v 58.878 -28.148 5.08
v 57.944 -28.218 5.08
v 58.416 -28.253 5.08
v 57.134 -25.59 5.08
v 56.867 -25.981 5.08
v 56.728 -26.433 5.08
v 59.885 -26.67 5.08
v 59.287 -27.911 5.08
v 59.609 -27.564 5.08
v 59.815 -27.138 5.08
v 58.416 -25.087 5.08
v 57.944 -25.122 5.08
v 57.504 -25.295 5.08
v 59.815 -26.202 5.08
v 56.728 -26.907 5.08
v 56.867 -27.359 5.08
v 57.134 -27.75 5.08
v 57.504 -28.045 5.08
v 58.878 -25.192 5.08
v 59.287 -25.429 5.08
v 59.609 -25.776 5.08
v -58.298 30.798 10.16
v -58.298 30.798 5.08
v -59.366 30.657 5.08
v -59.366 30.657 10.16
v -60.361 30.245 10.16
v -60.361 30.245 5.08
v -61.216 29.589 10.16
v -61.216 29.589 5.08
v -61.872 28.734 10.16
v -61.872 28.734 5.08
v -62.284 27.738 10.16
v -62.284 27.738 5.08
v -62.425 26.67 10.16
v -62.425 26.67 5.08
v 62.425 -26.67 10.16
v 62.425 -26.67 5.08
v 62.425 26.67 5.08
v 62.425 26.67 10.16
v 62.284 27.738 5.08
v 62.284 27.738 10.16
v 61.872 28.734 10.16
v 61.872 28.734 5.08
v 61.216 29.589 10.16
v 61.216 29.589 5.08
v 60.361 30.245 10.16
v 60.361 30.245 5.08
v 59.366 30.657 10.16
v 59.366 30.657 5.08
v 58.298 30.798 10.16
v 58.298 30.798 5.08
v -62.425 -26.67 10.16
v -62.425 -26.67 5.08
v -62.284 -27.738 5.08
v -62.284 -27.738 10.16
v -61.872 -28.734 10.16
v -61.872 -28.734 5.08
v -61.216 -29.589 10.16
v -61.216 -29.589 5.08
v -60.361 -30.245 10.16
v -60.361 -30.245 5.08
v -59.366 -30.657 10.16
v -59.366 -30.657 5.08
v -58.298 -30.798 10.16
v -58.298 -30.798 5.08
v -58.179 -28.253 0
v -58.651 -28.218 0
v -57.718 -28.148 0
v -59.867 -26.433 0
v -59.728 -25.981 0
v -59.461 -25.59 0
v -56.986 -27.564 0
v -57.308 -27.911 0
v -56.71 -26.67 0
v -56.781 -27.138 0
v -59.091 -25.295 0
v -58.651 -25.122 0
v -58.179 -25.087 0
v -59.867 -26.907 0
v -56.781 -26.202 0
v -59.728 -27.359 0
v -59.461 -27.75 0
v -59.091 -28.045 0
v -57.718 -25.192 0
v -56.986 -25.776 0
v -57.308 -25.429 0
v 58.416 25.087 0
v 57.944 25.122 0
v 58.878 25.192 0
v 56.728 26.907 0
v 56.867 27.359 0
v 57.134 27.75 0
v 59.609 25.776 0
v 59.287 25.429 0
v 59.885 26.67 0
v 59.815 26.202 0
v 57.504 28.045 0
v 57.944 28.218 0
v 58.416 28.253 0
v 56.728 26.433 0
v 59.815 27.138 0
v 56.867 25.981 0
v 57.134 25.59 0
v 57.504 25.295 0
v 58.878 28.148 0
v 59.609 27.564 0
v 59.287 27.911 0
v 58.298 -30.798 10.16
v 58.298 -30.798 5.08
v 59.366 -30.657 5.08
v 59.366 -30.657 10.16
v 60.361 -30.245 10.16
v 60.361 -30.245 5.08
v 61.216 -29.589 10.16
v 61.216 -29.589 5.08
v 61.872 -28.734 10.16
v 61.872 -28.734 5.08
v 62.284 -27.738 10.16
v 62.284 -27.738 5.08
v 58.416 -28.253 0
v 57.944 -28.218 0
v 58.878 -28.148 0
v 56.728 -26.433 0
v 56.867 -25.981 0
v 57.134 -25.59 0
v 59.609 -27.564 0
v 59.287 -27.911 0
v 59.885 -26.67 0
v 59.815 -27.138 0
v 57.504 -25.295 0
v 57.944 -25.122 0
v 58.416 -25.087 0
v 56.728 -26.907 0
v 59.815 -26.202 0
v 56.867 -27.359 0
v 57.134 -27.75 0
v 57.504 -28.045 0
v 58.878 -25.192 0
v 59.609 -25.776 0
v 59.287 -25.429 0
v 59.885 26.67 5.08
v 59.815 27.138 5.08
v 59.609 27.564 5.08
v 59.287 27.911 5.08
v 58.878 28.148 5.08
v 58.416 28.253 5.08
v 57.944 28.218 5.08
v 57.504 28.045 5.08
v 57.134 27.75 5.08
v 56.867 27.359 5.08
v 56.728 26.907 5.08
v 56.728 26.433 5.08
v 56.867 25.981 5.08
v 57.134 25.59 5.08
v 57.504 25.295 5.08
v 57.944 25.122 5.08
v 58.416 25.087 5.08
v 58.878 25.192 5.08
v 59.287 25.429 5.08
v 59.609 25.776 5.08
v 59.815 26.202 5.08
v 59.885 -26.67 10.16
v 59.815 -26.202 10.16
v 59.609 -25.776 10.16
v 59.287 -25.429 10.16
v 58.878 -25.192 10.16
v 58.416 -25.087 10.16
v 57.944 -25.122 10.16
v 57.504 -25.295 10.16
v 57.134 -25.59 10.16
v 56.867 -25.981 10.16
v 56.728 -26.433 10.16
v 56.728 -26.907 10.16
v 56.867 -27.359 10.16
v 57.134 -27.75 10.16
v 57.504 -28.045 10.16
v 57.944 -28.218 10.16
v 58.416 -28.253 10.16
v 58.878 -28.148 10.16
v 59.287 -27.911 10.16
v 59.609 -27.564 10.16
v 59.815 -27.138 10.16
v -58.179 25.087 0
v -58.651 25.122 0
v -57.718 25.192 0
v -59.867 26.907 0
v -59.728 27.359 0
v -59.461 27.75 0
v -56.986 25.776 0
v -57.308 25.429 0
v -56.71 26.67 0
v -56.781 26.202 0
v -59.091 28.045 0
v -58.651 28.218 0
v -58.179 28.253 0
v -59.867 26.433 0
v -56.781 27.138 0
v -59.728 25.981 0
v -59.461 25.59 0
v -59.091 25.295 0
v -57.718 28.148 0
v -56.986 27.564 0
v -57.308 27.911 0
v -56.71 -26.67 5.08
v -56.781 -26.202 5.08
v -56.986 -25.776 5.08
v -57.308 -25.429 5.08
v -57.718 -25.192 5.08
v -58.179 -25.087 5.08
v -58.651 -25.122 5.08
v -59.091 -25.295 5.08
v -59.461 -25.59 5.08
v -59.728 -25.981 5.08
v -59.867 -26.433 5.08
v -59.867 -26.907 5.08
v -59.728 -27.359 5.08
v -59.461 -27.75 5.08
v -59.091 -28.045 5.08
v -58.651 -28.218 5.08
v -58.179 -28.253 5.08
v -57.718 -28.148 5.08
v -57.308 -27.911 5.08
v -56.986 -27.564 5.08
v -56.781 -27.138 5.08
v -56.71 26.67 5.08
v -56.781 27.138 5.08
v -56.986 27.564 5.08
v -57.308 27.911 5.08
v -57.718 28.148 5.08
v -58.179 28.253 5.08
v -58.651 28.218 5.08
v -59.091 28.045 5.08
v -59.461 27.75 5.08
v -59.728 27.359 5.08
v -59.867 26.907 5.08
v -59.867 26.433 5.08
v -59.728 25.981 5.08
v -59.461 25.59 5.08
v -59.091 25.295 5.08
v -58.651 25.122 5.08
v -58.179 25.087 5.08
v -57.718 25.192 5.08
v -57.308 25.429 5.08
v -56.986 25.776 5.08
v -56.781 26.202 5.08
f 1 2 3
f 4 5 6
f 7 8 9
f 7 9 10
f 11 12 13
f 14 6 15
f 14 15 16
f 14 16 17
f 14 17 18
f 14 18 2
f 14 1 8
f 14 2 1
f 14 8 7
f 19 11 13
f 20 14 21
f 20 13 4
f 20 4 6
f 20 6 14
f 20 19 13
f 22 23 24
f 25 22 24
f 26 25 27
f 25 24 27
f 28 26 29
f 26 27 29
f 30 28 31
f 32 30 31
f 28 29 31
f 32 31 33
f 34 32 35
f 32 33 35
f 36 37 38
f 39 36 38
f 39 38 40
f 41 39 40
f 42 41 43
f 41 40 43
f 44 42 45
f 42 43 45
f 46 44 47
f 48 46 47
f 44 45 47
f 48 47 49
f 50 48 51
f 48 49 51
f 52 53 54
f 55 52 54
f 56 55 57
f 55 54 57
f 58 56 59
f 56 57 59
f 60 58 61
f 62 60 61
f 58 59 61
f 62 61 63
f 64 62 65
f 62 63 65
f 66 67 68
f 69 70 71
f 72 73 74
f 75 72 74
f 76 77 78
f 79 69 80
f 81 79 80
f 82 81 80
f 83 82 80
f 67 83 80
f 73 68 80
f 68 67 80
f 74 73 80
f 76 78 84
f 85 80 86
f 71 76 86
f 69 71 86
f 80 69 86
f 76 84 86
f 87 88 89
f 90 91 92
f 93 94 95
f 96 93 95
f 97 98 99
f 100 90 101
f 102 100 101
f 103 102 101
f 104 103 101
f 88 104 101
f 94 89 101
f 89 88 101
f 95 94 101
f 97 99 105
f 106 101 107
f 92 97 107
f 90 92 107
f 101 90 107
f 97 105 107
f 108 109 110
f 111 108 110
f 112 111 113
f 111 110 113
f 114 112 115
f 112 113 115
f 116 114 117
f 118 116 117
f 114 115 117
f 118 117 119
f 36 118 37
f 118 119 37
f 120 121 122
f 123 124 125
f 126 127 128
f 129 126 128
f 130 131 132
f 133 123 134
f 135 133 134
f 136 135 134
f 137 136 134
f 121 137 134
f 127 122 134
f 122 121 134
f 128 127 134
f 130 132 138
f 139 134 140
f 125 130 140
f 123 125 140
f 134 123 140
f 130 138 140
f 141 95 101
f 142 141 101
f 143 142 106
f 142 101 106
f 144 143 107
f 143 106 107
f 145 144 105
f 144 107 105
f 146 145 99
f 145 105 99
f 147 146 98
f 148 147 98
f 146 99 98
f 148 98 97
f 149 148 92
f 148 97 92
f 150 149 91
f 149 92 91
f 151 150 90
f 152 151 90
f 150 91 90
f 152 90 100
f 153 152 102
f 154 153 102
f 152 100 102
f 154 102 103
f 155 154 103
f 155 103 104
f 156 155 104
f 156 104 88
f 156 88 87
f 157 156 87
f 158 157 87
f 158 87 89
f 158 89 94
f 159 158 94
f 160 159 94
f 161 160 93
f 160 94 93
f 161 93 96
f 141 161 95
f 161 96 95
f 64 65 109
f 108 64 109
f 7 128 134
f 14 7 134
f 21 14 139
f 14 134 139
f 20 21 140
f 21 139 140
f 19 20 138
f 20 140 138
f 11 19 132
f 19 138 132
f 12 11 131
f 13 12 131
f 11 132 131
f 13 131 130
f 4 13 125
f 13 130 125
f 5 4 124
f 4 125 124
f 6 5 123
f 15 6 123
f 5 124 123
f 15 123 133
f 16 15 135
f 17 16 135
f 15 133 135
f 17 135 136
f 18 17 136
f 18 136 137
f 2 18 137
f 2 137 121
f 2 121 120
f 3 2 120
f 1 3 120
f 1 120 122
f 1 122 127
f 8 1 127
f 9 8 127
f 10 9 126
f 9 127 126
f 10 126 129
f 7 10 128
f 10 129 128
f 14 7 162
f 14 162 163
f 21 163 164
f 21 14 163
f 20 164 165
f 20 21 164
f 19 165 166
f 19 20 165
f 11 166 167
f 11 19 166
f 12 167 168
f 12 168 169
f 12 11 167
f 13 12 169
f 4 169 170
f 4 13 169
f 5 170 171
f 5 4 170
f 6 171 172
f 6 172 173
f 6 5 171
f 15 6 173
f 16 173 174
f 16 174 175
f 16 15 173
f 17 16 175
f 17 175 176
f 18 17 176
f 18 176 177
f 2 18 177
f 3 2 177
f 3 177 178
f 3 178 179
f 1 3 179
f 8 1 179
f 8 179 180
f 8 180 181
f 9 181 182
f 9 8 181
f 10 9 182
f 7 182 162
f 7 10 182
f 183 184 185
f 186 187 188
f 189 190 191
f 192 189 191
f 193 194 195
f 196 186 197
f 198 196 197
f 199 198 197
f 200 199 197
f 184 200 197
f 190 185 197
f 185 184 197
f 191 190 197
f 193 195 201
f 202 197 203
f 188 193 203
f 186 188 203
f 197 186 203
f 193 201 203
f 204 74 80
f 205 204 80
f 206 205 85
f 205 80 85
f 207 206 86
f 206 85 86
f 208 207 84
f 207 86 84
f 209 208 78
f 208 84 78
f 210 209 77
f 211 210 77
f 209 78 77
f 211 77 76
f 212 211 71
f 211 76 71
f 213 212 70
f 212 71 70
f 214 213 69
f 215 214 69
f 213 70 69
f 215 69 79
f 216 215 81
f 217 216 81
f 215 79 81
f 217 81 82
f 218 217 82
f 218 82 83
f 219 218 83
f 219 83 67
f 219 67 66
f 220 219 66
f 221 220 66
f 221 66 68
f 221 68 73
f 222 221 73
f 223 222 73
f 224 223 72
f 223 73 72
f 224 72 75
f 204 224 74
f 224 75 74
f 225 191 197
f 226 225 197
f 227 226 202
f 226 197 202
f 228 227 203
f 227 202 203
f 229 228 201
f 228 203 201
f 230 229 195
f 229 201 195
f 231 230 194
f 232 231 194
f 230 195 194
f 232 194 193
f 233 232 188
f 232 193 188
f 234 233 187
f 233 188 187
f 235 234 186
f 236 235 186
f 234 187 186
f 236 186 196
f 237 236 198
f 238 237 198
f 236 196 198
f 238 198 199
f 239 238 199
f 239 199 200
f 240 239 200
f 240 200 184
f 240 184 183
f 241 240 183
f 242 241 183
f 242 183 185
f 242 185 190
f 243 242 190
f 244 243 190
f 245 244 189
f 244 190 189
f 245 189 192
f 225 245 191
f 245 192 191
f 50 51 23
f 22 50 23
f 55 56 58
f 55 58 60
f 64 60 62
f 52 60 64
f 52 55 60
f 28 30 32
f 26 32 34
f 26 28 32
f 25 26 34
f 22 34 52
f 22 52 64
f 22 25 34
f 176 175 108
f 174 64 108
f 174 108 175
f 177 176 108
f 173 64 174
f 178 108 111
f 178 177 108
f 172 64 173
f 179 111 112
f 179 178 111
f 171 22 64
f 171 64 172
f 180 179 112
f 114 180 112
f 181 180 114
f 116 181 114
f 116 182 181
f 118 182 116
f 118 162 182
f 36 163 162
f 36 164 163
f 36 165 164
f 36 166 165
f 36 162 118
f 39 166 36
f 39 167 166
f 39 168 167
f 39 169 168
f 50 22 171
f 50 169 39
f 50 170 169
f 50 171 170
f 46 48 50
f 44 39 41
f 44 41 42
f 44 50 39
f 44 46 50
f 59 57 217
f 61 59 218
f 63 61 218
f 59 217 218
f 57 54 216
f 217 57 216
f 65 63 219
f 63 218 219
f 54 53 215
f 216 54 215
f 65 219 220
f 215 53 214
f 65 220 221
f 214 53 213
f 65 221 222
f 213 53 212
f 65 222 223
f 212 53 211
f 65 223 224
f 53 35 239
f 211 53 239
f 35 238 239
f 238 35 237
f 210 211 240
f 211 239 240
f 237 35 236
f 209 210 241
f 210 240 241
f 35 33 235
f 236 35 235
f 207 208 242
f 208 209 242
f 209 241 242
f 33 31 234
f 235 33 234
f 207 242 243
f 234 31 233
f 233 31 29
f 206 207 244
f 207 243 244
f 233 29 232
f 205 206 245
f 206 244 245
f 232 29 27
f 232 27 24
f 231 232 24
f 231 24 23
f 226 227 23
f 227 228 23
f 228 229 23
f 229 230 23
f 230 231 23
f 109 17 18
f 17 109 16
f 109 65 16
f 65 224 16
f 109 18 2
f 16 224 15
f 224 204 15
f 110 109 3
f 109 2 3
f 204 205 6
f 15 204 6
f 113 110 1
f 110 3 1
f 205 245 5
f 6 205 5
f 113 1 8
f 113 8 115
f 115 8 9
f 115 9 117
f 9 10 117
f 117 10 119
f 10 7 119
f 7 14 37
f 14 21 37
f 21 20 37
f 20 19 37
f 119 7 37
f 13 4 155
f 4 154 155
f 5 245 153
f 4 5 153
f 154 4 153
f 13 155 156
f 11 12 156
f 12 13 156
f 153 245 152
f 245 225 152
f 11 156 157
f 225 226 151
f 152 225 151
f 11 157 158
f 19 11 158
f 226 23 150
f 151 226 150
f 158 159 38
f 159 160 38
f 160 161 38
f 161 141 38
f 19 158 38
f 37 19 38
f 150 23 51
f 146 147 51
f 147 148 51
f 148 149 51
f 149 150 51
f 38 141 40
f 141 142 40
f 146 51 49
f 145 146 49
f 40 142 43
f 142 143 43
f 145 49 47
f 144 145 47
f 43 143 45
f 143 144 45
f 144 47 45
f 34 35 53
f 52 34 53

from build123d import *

# Parameters (mm, degrees)
SKETCH1_R             = 1.5875
BOSS_EXTRUDE1_DEPTH   = 5.08
BOSS_EXTRUDE1_2_DEPTH = 5.08
BOSS_EXTRUDE1_3_DEPTH = 5.08
BOSS_EXTRUDE1_4_DEPTH = 5.08
SKETCH3_R             = 1.5875
BOSS_EXTRUDE2_DEPTH   = 5.08


with BuildPart() as part:
    # Sketch1 → Boss-Extrude1 (new body)
    with BuildSketch(Plane.XY):
        with Locations((-58.297572, -26.67)):
            Circle(SKETCH1_R)
    extrude(amount=BOSS_EXTRUDE1_DEPTH)



with BuildPart() as body_2:
    # Sketch1 → Boss-Extrude1 2 (new body)
    with BuildSketch(Plane.XY):
        with Locations((-58.297572, 26.67)):
            Circle(SKETCH1_R)
    extrude(amount=BOSS_EXTRUDE1_2_DEPTH)


with BuildPart() as body_3:
    # Sketch1 → Boss-Extrude1 3 (new body)
    with BuildSketch(Plane.XY):
        with Locations((58.297572, 26.67)):
            Circle(SKETCH1_R)
    extrude(amount=BOSS_EXTRUDE1_3_DEPTH)


with BuildPart() as body_4:
    # Sketch1 → Boss-Extrude1 4 (new body)
    with BuildSketch(Plane.XY):
        with Locations((58.297572, -26.67)):
            Circle(SKETCH1_R)
    extrude(amount=BOSS_EXTRUDE1_4_DEPTH)


with BuildPart() as part_1:
    add(part.part)

    add(body_2.part)  # Boss-Extrude2 merges body 2

    add(body_3.part)  # Boss-Extrude2 merges body 3
    # Sketch3 → Boss-Extrude2 (add)
    with BuildSketch(Plane.XY.offset(5.08)):
        with BuildLine():
            Line((58.297572, 30.7975), (-58.297572, 30.7975))
            ThreePointArc((-58.297572, 30.7975), (-61.216155239, 29.588583239), (-62.425072, 26.67))
            Line((-62.425072, 26.67), (-62.425072, -26.67))
            ThreePointArc((-62.425072, -26.67), (-61.216155239, -29.588583239), (-58.297572, -30.7975))
            Line((-58.297572, -30.7975), (58.297572, -30.7975))
            ThreePointArc((58.297572, -30.7975), (61.216155239, -29.588583239), (62.425072, -26.67))
            Line((62.425072, -26.67), (62.425072, 26.67))
            ThreePointArc((62.425072, 26.67), (61.216155239, 29.588583239), (58.297572, 30.7975))
        make_face()
        with Locations((58.297572, -26.67)):
            Circle(SKETCH3_R, mode=Mode.SUBTRACT)
    extrude(amount=BOSS_EXTRUDE2_DEPTH)


solid = Compound([body_4.part, part_1.part])
